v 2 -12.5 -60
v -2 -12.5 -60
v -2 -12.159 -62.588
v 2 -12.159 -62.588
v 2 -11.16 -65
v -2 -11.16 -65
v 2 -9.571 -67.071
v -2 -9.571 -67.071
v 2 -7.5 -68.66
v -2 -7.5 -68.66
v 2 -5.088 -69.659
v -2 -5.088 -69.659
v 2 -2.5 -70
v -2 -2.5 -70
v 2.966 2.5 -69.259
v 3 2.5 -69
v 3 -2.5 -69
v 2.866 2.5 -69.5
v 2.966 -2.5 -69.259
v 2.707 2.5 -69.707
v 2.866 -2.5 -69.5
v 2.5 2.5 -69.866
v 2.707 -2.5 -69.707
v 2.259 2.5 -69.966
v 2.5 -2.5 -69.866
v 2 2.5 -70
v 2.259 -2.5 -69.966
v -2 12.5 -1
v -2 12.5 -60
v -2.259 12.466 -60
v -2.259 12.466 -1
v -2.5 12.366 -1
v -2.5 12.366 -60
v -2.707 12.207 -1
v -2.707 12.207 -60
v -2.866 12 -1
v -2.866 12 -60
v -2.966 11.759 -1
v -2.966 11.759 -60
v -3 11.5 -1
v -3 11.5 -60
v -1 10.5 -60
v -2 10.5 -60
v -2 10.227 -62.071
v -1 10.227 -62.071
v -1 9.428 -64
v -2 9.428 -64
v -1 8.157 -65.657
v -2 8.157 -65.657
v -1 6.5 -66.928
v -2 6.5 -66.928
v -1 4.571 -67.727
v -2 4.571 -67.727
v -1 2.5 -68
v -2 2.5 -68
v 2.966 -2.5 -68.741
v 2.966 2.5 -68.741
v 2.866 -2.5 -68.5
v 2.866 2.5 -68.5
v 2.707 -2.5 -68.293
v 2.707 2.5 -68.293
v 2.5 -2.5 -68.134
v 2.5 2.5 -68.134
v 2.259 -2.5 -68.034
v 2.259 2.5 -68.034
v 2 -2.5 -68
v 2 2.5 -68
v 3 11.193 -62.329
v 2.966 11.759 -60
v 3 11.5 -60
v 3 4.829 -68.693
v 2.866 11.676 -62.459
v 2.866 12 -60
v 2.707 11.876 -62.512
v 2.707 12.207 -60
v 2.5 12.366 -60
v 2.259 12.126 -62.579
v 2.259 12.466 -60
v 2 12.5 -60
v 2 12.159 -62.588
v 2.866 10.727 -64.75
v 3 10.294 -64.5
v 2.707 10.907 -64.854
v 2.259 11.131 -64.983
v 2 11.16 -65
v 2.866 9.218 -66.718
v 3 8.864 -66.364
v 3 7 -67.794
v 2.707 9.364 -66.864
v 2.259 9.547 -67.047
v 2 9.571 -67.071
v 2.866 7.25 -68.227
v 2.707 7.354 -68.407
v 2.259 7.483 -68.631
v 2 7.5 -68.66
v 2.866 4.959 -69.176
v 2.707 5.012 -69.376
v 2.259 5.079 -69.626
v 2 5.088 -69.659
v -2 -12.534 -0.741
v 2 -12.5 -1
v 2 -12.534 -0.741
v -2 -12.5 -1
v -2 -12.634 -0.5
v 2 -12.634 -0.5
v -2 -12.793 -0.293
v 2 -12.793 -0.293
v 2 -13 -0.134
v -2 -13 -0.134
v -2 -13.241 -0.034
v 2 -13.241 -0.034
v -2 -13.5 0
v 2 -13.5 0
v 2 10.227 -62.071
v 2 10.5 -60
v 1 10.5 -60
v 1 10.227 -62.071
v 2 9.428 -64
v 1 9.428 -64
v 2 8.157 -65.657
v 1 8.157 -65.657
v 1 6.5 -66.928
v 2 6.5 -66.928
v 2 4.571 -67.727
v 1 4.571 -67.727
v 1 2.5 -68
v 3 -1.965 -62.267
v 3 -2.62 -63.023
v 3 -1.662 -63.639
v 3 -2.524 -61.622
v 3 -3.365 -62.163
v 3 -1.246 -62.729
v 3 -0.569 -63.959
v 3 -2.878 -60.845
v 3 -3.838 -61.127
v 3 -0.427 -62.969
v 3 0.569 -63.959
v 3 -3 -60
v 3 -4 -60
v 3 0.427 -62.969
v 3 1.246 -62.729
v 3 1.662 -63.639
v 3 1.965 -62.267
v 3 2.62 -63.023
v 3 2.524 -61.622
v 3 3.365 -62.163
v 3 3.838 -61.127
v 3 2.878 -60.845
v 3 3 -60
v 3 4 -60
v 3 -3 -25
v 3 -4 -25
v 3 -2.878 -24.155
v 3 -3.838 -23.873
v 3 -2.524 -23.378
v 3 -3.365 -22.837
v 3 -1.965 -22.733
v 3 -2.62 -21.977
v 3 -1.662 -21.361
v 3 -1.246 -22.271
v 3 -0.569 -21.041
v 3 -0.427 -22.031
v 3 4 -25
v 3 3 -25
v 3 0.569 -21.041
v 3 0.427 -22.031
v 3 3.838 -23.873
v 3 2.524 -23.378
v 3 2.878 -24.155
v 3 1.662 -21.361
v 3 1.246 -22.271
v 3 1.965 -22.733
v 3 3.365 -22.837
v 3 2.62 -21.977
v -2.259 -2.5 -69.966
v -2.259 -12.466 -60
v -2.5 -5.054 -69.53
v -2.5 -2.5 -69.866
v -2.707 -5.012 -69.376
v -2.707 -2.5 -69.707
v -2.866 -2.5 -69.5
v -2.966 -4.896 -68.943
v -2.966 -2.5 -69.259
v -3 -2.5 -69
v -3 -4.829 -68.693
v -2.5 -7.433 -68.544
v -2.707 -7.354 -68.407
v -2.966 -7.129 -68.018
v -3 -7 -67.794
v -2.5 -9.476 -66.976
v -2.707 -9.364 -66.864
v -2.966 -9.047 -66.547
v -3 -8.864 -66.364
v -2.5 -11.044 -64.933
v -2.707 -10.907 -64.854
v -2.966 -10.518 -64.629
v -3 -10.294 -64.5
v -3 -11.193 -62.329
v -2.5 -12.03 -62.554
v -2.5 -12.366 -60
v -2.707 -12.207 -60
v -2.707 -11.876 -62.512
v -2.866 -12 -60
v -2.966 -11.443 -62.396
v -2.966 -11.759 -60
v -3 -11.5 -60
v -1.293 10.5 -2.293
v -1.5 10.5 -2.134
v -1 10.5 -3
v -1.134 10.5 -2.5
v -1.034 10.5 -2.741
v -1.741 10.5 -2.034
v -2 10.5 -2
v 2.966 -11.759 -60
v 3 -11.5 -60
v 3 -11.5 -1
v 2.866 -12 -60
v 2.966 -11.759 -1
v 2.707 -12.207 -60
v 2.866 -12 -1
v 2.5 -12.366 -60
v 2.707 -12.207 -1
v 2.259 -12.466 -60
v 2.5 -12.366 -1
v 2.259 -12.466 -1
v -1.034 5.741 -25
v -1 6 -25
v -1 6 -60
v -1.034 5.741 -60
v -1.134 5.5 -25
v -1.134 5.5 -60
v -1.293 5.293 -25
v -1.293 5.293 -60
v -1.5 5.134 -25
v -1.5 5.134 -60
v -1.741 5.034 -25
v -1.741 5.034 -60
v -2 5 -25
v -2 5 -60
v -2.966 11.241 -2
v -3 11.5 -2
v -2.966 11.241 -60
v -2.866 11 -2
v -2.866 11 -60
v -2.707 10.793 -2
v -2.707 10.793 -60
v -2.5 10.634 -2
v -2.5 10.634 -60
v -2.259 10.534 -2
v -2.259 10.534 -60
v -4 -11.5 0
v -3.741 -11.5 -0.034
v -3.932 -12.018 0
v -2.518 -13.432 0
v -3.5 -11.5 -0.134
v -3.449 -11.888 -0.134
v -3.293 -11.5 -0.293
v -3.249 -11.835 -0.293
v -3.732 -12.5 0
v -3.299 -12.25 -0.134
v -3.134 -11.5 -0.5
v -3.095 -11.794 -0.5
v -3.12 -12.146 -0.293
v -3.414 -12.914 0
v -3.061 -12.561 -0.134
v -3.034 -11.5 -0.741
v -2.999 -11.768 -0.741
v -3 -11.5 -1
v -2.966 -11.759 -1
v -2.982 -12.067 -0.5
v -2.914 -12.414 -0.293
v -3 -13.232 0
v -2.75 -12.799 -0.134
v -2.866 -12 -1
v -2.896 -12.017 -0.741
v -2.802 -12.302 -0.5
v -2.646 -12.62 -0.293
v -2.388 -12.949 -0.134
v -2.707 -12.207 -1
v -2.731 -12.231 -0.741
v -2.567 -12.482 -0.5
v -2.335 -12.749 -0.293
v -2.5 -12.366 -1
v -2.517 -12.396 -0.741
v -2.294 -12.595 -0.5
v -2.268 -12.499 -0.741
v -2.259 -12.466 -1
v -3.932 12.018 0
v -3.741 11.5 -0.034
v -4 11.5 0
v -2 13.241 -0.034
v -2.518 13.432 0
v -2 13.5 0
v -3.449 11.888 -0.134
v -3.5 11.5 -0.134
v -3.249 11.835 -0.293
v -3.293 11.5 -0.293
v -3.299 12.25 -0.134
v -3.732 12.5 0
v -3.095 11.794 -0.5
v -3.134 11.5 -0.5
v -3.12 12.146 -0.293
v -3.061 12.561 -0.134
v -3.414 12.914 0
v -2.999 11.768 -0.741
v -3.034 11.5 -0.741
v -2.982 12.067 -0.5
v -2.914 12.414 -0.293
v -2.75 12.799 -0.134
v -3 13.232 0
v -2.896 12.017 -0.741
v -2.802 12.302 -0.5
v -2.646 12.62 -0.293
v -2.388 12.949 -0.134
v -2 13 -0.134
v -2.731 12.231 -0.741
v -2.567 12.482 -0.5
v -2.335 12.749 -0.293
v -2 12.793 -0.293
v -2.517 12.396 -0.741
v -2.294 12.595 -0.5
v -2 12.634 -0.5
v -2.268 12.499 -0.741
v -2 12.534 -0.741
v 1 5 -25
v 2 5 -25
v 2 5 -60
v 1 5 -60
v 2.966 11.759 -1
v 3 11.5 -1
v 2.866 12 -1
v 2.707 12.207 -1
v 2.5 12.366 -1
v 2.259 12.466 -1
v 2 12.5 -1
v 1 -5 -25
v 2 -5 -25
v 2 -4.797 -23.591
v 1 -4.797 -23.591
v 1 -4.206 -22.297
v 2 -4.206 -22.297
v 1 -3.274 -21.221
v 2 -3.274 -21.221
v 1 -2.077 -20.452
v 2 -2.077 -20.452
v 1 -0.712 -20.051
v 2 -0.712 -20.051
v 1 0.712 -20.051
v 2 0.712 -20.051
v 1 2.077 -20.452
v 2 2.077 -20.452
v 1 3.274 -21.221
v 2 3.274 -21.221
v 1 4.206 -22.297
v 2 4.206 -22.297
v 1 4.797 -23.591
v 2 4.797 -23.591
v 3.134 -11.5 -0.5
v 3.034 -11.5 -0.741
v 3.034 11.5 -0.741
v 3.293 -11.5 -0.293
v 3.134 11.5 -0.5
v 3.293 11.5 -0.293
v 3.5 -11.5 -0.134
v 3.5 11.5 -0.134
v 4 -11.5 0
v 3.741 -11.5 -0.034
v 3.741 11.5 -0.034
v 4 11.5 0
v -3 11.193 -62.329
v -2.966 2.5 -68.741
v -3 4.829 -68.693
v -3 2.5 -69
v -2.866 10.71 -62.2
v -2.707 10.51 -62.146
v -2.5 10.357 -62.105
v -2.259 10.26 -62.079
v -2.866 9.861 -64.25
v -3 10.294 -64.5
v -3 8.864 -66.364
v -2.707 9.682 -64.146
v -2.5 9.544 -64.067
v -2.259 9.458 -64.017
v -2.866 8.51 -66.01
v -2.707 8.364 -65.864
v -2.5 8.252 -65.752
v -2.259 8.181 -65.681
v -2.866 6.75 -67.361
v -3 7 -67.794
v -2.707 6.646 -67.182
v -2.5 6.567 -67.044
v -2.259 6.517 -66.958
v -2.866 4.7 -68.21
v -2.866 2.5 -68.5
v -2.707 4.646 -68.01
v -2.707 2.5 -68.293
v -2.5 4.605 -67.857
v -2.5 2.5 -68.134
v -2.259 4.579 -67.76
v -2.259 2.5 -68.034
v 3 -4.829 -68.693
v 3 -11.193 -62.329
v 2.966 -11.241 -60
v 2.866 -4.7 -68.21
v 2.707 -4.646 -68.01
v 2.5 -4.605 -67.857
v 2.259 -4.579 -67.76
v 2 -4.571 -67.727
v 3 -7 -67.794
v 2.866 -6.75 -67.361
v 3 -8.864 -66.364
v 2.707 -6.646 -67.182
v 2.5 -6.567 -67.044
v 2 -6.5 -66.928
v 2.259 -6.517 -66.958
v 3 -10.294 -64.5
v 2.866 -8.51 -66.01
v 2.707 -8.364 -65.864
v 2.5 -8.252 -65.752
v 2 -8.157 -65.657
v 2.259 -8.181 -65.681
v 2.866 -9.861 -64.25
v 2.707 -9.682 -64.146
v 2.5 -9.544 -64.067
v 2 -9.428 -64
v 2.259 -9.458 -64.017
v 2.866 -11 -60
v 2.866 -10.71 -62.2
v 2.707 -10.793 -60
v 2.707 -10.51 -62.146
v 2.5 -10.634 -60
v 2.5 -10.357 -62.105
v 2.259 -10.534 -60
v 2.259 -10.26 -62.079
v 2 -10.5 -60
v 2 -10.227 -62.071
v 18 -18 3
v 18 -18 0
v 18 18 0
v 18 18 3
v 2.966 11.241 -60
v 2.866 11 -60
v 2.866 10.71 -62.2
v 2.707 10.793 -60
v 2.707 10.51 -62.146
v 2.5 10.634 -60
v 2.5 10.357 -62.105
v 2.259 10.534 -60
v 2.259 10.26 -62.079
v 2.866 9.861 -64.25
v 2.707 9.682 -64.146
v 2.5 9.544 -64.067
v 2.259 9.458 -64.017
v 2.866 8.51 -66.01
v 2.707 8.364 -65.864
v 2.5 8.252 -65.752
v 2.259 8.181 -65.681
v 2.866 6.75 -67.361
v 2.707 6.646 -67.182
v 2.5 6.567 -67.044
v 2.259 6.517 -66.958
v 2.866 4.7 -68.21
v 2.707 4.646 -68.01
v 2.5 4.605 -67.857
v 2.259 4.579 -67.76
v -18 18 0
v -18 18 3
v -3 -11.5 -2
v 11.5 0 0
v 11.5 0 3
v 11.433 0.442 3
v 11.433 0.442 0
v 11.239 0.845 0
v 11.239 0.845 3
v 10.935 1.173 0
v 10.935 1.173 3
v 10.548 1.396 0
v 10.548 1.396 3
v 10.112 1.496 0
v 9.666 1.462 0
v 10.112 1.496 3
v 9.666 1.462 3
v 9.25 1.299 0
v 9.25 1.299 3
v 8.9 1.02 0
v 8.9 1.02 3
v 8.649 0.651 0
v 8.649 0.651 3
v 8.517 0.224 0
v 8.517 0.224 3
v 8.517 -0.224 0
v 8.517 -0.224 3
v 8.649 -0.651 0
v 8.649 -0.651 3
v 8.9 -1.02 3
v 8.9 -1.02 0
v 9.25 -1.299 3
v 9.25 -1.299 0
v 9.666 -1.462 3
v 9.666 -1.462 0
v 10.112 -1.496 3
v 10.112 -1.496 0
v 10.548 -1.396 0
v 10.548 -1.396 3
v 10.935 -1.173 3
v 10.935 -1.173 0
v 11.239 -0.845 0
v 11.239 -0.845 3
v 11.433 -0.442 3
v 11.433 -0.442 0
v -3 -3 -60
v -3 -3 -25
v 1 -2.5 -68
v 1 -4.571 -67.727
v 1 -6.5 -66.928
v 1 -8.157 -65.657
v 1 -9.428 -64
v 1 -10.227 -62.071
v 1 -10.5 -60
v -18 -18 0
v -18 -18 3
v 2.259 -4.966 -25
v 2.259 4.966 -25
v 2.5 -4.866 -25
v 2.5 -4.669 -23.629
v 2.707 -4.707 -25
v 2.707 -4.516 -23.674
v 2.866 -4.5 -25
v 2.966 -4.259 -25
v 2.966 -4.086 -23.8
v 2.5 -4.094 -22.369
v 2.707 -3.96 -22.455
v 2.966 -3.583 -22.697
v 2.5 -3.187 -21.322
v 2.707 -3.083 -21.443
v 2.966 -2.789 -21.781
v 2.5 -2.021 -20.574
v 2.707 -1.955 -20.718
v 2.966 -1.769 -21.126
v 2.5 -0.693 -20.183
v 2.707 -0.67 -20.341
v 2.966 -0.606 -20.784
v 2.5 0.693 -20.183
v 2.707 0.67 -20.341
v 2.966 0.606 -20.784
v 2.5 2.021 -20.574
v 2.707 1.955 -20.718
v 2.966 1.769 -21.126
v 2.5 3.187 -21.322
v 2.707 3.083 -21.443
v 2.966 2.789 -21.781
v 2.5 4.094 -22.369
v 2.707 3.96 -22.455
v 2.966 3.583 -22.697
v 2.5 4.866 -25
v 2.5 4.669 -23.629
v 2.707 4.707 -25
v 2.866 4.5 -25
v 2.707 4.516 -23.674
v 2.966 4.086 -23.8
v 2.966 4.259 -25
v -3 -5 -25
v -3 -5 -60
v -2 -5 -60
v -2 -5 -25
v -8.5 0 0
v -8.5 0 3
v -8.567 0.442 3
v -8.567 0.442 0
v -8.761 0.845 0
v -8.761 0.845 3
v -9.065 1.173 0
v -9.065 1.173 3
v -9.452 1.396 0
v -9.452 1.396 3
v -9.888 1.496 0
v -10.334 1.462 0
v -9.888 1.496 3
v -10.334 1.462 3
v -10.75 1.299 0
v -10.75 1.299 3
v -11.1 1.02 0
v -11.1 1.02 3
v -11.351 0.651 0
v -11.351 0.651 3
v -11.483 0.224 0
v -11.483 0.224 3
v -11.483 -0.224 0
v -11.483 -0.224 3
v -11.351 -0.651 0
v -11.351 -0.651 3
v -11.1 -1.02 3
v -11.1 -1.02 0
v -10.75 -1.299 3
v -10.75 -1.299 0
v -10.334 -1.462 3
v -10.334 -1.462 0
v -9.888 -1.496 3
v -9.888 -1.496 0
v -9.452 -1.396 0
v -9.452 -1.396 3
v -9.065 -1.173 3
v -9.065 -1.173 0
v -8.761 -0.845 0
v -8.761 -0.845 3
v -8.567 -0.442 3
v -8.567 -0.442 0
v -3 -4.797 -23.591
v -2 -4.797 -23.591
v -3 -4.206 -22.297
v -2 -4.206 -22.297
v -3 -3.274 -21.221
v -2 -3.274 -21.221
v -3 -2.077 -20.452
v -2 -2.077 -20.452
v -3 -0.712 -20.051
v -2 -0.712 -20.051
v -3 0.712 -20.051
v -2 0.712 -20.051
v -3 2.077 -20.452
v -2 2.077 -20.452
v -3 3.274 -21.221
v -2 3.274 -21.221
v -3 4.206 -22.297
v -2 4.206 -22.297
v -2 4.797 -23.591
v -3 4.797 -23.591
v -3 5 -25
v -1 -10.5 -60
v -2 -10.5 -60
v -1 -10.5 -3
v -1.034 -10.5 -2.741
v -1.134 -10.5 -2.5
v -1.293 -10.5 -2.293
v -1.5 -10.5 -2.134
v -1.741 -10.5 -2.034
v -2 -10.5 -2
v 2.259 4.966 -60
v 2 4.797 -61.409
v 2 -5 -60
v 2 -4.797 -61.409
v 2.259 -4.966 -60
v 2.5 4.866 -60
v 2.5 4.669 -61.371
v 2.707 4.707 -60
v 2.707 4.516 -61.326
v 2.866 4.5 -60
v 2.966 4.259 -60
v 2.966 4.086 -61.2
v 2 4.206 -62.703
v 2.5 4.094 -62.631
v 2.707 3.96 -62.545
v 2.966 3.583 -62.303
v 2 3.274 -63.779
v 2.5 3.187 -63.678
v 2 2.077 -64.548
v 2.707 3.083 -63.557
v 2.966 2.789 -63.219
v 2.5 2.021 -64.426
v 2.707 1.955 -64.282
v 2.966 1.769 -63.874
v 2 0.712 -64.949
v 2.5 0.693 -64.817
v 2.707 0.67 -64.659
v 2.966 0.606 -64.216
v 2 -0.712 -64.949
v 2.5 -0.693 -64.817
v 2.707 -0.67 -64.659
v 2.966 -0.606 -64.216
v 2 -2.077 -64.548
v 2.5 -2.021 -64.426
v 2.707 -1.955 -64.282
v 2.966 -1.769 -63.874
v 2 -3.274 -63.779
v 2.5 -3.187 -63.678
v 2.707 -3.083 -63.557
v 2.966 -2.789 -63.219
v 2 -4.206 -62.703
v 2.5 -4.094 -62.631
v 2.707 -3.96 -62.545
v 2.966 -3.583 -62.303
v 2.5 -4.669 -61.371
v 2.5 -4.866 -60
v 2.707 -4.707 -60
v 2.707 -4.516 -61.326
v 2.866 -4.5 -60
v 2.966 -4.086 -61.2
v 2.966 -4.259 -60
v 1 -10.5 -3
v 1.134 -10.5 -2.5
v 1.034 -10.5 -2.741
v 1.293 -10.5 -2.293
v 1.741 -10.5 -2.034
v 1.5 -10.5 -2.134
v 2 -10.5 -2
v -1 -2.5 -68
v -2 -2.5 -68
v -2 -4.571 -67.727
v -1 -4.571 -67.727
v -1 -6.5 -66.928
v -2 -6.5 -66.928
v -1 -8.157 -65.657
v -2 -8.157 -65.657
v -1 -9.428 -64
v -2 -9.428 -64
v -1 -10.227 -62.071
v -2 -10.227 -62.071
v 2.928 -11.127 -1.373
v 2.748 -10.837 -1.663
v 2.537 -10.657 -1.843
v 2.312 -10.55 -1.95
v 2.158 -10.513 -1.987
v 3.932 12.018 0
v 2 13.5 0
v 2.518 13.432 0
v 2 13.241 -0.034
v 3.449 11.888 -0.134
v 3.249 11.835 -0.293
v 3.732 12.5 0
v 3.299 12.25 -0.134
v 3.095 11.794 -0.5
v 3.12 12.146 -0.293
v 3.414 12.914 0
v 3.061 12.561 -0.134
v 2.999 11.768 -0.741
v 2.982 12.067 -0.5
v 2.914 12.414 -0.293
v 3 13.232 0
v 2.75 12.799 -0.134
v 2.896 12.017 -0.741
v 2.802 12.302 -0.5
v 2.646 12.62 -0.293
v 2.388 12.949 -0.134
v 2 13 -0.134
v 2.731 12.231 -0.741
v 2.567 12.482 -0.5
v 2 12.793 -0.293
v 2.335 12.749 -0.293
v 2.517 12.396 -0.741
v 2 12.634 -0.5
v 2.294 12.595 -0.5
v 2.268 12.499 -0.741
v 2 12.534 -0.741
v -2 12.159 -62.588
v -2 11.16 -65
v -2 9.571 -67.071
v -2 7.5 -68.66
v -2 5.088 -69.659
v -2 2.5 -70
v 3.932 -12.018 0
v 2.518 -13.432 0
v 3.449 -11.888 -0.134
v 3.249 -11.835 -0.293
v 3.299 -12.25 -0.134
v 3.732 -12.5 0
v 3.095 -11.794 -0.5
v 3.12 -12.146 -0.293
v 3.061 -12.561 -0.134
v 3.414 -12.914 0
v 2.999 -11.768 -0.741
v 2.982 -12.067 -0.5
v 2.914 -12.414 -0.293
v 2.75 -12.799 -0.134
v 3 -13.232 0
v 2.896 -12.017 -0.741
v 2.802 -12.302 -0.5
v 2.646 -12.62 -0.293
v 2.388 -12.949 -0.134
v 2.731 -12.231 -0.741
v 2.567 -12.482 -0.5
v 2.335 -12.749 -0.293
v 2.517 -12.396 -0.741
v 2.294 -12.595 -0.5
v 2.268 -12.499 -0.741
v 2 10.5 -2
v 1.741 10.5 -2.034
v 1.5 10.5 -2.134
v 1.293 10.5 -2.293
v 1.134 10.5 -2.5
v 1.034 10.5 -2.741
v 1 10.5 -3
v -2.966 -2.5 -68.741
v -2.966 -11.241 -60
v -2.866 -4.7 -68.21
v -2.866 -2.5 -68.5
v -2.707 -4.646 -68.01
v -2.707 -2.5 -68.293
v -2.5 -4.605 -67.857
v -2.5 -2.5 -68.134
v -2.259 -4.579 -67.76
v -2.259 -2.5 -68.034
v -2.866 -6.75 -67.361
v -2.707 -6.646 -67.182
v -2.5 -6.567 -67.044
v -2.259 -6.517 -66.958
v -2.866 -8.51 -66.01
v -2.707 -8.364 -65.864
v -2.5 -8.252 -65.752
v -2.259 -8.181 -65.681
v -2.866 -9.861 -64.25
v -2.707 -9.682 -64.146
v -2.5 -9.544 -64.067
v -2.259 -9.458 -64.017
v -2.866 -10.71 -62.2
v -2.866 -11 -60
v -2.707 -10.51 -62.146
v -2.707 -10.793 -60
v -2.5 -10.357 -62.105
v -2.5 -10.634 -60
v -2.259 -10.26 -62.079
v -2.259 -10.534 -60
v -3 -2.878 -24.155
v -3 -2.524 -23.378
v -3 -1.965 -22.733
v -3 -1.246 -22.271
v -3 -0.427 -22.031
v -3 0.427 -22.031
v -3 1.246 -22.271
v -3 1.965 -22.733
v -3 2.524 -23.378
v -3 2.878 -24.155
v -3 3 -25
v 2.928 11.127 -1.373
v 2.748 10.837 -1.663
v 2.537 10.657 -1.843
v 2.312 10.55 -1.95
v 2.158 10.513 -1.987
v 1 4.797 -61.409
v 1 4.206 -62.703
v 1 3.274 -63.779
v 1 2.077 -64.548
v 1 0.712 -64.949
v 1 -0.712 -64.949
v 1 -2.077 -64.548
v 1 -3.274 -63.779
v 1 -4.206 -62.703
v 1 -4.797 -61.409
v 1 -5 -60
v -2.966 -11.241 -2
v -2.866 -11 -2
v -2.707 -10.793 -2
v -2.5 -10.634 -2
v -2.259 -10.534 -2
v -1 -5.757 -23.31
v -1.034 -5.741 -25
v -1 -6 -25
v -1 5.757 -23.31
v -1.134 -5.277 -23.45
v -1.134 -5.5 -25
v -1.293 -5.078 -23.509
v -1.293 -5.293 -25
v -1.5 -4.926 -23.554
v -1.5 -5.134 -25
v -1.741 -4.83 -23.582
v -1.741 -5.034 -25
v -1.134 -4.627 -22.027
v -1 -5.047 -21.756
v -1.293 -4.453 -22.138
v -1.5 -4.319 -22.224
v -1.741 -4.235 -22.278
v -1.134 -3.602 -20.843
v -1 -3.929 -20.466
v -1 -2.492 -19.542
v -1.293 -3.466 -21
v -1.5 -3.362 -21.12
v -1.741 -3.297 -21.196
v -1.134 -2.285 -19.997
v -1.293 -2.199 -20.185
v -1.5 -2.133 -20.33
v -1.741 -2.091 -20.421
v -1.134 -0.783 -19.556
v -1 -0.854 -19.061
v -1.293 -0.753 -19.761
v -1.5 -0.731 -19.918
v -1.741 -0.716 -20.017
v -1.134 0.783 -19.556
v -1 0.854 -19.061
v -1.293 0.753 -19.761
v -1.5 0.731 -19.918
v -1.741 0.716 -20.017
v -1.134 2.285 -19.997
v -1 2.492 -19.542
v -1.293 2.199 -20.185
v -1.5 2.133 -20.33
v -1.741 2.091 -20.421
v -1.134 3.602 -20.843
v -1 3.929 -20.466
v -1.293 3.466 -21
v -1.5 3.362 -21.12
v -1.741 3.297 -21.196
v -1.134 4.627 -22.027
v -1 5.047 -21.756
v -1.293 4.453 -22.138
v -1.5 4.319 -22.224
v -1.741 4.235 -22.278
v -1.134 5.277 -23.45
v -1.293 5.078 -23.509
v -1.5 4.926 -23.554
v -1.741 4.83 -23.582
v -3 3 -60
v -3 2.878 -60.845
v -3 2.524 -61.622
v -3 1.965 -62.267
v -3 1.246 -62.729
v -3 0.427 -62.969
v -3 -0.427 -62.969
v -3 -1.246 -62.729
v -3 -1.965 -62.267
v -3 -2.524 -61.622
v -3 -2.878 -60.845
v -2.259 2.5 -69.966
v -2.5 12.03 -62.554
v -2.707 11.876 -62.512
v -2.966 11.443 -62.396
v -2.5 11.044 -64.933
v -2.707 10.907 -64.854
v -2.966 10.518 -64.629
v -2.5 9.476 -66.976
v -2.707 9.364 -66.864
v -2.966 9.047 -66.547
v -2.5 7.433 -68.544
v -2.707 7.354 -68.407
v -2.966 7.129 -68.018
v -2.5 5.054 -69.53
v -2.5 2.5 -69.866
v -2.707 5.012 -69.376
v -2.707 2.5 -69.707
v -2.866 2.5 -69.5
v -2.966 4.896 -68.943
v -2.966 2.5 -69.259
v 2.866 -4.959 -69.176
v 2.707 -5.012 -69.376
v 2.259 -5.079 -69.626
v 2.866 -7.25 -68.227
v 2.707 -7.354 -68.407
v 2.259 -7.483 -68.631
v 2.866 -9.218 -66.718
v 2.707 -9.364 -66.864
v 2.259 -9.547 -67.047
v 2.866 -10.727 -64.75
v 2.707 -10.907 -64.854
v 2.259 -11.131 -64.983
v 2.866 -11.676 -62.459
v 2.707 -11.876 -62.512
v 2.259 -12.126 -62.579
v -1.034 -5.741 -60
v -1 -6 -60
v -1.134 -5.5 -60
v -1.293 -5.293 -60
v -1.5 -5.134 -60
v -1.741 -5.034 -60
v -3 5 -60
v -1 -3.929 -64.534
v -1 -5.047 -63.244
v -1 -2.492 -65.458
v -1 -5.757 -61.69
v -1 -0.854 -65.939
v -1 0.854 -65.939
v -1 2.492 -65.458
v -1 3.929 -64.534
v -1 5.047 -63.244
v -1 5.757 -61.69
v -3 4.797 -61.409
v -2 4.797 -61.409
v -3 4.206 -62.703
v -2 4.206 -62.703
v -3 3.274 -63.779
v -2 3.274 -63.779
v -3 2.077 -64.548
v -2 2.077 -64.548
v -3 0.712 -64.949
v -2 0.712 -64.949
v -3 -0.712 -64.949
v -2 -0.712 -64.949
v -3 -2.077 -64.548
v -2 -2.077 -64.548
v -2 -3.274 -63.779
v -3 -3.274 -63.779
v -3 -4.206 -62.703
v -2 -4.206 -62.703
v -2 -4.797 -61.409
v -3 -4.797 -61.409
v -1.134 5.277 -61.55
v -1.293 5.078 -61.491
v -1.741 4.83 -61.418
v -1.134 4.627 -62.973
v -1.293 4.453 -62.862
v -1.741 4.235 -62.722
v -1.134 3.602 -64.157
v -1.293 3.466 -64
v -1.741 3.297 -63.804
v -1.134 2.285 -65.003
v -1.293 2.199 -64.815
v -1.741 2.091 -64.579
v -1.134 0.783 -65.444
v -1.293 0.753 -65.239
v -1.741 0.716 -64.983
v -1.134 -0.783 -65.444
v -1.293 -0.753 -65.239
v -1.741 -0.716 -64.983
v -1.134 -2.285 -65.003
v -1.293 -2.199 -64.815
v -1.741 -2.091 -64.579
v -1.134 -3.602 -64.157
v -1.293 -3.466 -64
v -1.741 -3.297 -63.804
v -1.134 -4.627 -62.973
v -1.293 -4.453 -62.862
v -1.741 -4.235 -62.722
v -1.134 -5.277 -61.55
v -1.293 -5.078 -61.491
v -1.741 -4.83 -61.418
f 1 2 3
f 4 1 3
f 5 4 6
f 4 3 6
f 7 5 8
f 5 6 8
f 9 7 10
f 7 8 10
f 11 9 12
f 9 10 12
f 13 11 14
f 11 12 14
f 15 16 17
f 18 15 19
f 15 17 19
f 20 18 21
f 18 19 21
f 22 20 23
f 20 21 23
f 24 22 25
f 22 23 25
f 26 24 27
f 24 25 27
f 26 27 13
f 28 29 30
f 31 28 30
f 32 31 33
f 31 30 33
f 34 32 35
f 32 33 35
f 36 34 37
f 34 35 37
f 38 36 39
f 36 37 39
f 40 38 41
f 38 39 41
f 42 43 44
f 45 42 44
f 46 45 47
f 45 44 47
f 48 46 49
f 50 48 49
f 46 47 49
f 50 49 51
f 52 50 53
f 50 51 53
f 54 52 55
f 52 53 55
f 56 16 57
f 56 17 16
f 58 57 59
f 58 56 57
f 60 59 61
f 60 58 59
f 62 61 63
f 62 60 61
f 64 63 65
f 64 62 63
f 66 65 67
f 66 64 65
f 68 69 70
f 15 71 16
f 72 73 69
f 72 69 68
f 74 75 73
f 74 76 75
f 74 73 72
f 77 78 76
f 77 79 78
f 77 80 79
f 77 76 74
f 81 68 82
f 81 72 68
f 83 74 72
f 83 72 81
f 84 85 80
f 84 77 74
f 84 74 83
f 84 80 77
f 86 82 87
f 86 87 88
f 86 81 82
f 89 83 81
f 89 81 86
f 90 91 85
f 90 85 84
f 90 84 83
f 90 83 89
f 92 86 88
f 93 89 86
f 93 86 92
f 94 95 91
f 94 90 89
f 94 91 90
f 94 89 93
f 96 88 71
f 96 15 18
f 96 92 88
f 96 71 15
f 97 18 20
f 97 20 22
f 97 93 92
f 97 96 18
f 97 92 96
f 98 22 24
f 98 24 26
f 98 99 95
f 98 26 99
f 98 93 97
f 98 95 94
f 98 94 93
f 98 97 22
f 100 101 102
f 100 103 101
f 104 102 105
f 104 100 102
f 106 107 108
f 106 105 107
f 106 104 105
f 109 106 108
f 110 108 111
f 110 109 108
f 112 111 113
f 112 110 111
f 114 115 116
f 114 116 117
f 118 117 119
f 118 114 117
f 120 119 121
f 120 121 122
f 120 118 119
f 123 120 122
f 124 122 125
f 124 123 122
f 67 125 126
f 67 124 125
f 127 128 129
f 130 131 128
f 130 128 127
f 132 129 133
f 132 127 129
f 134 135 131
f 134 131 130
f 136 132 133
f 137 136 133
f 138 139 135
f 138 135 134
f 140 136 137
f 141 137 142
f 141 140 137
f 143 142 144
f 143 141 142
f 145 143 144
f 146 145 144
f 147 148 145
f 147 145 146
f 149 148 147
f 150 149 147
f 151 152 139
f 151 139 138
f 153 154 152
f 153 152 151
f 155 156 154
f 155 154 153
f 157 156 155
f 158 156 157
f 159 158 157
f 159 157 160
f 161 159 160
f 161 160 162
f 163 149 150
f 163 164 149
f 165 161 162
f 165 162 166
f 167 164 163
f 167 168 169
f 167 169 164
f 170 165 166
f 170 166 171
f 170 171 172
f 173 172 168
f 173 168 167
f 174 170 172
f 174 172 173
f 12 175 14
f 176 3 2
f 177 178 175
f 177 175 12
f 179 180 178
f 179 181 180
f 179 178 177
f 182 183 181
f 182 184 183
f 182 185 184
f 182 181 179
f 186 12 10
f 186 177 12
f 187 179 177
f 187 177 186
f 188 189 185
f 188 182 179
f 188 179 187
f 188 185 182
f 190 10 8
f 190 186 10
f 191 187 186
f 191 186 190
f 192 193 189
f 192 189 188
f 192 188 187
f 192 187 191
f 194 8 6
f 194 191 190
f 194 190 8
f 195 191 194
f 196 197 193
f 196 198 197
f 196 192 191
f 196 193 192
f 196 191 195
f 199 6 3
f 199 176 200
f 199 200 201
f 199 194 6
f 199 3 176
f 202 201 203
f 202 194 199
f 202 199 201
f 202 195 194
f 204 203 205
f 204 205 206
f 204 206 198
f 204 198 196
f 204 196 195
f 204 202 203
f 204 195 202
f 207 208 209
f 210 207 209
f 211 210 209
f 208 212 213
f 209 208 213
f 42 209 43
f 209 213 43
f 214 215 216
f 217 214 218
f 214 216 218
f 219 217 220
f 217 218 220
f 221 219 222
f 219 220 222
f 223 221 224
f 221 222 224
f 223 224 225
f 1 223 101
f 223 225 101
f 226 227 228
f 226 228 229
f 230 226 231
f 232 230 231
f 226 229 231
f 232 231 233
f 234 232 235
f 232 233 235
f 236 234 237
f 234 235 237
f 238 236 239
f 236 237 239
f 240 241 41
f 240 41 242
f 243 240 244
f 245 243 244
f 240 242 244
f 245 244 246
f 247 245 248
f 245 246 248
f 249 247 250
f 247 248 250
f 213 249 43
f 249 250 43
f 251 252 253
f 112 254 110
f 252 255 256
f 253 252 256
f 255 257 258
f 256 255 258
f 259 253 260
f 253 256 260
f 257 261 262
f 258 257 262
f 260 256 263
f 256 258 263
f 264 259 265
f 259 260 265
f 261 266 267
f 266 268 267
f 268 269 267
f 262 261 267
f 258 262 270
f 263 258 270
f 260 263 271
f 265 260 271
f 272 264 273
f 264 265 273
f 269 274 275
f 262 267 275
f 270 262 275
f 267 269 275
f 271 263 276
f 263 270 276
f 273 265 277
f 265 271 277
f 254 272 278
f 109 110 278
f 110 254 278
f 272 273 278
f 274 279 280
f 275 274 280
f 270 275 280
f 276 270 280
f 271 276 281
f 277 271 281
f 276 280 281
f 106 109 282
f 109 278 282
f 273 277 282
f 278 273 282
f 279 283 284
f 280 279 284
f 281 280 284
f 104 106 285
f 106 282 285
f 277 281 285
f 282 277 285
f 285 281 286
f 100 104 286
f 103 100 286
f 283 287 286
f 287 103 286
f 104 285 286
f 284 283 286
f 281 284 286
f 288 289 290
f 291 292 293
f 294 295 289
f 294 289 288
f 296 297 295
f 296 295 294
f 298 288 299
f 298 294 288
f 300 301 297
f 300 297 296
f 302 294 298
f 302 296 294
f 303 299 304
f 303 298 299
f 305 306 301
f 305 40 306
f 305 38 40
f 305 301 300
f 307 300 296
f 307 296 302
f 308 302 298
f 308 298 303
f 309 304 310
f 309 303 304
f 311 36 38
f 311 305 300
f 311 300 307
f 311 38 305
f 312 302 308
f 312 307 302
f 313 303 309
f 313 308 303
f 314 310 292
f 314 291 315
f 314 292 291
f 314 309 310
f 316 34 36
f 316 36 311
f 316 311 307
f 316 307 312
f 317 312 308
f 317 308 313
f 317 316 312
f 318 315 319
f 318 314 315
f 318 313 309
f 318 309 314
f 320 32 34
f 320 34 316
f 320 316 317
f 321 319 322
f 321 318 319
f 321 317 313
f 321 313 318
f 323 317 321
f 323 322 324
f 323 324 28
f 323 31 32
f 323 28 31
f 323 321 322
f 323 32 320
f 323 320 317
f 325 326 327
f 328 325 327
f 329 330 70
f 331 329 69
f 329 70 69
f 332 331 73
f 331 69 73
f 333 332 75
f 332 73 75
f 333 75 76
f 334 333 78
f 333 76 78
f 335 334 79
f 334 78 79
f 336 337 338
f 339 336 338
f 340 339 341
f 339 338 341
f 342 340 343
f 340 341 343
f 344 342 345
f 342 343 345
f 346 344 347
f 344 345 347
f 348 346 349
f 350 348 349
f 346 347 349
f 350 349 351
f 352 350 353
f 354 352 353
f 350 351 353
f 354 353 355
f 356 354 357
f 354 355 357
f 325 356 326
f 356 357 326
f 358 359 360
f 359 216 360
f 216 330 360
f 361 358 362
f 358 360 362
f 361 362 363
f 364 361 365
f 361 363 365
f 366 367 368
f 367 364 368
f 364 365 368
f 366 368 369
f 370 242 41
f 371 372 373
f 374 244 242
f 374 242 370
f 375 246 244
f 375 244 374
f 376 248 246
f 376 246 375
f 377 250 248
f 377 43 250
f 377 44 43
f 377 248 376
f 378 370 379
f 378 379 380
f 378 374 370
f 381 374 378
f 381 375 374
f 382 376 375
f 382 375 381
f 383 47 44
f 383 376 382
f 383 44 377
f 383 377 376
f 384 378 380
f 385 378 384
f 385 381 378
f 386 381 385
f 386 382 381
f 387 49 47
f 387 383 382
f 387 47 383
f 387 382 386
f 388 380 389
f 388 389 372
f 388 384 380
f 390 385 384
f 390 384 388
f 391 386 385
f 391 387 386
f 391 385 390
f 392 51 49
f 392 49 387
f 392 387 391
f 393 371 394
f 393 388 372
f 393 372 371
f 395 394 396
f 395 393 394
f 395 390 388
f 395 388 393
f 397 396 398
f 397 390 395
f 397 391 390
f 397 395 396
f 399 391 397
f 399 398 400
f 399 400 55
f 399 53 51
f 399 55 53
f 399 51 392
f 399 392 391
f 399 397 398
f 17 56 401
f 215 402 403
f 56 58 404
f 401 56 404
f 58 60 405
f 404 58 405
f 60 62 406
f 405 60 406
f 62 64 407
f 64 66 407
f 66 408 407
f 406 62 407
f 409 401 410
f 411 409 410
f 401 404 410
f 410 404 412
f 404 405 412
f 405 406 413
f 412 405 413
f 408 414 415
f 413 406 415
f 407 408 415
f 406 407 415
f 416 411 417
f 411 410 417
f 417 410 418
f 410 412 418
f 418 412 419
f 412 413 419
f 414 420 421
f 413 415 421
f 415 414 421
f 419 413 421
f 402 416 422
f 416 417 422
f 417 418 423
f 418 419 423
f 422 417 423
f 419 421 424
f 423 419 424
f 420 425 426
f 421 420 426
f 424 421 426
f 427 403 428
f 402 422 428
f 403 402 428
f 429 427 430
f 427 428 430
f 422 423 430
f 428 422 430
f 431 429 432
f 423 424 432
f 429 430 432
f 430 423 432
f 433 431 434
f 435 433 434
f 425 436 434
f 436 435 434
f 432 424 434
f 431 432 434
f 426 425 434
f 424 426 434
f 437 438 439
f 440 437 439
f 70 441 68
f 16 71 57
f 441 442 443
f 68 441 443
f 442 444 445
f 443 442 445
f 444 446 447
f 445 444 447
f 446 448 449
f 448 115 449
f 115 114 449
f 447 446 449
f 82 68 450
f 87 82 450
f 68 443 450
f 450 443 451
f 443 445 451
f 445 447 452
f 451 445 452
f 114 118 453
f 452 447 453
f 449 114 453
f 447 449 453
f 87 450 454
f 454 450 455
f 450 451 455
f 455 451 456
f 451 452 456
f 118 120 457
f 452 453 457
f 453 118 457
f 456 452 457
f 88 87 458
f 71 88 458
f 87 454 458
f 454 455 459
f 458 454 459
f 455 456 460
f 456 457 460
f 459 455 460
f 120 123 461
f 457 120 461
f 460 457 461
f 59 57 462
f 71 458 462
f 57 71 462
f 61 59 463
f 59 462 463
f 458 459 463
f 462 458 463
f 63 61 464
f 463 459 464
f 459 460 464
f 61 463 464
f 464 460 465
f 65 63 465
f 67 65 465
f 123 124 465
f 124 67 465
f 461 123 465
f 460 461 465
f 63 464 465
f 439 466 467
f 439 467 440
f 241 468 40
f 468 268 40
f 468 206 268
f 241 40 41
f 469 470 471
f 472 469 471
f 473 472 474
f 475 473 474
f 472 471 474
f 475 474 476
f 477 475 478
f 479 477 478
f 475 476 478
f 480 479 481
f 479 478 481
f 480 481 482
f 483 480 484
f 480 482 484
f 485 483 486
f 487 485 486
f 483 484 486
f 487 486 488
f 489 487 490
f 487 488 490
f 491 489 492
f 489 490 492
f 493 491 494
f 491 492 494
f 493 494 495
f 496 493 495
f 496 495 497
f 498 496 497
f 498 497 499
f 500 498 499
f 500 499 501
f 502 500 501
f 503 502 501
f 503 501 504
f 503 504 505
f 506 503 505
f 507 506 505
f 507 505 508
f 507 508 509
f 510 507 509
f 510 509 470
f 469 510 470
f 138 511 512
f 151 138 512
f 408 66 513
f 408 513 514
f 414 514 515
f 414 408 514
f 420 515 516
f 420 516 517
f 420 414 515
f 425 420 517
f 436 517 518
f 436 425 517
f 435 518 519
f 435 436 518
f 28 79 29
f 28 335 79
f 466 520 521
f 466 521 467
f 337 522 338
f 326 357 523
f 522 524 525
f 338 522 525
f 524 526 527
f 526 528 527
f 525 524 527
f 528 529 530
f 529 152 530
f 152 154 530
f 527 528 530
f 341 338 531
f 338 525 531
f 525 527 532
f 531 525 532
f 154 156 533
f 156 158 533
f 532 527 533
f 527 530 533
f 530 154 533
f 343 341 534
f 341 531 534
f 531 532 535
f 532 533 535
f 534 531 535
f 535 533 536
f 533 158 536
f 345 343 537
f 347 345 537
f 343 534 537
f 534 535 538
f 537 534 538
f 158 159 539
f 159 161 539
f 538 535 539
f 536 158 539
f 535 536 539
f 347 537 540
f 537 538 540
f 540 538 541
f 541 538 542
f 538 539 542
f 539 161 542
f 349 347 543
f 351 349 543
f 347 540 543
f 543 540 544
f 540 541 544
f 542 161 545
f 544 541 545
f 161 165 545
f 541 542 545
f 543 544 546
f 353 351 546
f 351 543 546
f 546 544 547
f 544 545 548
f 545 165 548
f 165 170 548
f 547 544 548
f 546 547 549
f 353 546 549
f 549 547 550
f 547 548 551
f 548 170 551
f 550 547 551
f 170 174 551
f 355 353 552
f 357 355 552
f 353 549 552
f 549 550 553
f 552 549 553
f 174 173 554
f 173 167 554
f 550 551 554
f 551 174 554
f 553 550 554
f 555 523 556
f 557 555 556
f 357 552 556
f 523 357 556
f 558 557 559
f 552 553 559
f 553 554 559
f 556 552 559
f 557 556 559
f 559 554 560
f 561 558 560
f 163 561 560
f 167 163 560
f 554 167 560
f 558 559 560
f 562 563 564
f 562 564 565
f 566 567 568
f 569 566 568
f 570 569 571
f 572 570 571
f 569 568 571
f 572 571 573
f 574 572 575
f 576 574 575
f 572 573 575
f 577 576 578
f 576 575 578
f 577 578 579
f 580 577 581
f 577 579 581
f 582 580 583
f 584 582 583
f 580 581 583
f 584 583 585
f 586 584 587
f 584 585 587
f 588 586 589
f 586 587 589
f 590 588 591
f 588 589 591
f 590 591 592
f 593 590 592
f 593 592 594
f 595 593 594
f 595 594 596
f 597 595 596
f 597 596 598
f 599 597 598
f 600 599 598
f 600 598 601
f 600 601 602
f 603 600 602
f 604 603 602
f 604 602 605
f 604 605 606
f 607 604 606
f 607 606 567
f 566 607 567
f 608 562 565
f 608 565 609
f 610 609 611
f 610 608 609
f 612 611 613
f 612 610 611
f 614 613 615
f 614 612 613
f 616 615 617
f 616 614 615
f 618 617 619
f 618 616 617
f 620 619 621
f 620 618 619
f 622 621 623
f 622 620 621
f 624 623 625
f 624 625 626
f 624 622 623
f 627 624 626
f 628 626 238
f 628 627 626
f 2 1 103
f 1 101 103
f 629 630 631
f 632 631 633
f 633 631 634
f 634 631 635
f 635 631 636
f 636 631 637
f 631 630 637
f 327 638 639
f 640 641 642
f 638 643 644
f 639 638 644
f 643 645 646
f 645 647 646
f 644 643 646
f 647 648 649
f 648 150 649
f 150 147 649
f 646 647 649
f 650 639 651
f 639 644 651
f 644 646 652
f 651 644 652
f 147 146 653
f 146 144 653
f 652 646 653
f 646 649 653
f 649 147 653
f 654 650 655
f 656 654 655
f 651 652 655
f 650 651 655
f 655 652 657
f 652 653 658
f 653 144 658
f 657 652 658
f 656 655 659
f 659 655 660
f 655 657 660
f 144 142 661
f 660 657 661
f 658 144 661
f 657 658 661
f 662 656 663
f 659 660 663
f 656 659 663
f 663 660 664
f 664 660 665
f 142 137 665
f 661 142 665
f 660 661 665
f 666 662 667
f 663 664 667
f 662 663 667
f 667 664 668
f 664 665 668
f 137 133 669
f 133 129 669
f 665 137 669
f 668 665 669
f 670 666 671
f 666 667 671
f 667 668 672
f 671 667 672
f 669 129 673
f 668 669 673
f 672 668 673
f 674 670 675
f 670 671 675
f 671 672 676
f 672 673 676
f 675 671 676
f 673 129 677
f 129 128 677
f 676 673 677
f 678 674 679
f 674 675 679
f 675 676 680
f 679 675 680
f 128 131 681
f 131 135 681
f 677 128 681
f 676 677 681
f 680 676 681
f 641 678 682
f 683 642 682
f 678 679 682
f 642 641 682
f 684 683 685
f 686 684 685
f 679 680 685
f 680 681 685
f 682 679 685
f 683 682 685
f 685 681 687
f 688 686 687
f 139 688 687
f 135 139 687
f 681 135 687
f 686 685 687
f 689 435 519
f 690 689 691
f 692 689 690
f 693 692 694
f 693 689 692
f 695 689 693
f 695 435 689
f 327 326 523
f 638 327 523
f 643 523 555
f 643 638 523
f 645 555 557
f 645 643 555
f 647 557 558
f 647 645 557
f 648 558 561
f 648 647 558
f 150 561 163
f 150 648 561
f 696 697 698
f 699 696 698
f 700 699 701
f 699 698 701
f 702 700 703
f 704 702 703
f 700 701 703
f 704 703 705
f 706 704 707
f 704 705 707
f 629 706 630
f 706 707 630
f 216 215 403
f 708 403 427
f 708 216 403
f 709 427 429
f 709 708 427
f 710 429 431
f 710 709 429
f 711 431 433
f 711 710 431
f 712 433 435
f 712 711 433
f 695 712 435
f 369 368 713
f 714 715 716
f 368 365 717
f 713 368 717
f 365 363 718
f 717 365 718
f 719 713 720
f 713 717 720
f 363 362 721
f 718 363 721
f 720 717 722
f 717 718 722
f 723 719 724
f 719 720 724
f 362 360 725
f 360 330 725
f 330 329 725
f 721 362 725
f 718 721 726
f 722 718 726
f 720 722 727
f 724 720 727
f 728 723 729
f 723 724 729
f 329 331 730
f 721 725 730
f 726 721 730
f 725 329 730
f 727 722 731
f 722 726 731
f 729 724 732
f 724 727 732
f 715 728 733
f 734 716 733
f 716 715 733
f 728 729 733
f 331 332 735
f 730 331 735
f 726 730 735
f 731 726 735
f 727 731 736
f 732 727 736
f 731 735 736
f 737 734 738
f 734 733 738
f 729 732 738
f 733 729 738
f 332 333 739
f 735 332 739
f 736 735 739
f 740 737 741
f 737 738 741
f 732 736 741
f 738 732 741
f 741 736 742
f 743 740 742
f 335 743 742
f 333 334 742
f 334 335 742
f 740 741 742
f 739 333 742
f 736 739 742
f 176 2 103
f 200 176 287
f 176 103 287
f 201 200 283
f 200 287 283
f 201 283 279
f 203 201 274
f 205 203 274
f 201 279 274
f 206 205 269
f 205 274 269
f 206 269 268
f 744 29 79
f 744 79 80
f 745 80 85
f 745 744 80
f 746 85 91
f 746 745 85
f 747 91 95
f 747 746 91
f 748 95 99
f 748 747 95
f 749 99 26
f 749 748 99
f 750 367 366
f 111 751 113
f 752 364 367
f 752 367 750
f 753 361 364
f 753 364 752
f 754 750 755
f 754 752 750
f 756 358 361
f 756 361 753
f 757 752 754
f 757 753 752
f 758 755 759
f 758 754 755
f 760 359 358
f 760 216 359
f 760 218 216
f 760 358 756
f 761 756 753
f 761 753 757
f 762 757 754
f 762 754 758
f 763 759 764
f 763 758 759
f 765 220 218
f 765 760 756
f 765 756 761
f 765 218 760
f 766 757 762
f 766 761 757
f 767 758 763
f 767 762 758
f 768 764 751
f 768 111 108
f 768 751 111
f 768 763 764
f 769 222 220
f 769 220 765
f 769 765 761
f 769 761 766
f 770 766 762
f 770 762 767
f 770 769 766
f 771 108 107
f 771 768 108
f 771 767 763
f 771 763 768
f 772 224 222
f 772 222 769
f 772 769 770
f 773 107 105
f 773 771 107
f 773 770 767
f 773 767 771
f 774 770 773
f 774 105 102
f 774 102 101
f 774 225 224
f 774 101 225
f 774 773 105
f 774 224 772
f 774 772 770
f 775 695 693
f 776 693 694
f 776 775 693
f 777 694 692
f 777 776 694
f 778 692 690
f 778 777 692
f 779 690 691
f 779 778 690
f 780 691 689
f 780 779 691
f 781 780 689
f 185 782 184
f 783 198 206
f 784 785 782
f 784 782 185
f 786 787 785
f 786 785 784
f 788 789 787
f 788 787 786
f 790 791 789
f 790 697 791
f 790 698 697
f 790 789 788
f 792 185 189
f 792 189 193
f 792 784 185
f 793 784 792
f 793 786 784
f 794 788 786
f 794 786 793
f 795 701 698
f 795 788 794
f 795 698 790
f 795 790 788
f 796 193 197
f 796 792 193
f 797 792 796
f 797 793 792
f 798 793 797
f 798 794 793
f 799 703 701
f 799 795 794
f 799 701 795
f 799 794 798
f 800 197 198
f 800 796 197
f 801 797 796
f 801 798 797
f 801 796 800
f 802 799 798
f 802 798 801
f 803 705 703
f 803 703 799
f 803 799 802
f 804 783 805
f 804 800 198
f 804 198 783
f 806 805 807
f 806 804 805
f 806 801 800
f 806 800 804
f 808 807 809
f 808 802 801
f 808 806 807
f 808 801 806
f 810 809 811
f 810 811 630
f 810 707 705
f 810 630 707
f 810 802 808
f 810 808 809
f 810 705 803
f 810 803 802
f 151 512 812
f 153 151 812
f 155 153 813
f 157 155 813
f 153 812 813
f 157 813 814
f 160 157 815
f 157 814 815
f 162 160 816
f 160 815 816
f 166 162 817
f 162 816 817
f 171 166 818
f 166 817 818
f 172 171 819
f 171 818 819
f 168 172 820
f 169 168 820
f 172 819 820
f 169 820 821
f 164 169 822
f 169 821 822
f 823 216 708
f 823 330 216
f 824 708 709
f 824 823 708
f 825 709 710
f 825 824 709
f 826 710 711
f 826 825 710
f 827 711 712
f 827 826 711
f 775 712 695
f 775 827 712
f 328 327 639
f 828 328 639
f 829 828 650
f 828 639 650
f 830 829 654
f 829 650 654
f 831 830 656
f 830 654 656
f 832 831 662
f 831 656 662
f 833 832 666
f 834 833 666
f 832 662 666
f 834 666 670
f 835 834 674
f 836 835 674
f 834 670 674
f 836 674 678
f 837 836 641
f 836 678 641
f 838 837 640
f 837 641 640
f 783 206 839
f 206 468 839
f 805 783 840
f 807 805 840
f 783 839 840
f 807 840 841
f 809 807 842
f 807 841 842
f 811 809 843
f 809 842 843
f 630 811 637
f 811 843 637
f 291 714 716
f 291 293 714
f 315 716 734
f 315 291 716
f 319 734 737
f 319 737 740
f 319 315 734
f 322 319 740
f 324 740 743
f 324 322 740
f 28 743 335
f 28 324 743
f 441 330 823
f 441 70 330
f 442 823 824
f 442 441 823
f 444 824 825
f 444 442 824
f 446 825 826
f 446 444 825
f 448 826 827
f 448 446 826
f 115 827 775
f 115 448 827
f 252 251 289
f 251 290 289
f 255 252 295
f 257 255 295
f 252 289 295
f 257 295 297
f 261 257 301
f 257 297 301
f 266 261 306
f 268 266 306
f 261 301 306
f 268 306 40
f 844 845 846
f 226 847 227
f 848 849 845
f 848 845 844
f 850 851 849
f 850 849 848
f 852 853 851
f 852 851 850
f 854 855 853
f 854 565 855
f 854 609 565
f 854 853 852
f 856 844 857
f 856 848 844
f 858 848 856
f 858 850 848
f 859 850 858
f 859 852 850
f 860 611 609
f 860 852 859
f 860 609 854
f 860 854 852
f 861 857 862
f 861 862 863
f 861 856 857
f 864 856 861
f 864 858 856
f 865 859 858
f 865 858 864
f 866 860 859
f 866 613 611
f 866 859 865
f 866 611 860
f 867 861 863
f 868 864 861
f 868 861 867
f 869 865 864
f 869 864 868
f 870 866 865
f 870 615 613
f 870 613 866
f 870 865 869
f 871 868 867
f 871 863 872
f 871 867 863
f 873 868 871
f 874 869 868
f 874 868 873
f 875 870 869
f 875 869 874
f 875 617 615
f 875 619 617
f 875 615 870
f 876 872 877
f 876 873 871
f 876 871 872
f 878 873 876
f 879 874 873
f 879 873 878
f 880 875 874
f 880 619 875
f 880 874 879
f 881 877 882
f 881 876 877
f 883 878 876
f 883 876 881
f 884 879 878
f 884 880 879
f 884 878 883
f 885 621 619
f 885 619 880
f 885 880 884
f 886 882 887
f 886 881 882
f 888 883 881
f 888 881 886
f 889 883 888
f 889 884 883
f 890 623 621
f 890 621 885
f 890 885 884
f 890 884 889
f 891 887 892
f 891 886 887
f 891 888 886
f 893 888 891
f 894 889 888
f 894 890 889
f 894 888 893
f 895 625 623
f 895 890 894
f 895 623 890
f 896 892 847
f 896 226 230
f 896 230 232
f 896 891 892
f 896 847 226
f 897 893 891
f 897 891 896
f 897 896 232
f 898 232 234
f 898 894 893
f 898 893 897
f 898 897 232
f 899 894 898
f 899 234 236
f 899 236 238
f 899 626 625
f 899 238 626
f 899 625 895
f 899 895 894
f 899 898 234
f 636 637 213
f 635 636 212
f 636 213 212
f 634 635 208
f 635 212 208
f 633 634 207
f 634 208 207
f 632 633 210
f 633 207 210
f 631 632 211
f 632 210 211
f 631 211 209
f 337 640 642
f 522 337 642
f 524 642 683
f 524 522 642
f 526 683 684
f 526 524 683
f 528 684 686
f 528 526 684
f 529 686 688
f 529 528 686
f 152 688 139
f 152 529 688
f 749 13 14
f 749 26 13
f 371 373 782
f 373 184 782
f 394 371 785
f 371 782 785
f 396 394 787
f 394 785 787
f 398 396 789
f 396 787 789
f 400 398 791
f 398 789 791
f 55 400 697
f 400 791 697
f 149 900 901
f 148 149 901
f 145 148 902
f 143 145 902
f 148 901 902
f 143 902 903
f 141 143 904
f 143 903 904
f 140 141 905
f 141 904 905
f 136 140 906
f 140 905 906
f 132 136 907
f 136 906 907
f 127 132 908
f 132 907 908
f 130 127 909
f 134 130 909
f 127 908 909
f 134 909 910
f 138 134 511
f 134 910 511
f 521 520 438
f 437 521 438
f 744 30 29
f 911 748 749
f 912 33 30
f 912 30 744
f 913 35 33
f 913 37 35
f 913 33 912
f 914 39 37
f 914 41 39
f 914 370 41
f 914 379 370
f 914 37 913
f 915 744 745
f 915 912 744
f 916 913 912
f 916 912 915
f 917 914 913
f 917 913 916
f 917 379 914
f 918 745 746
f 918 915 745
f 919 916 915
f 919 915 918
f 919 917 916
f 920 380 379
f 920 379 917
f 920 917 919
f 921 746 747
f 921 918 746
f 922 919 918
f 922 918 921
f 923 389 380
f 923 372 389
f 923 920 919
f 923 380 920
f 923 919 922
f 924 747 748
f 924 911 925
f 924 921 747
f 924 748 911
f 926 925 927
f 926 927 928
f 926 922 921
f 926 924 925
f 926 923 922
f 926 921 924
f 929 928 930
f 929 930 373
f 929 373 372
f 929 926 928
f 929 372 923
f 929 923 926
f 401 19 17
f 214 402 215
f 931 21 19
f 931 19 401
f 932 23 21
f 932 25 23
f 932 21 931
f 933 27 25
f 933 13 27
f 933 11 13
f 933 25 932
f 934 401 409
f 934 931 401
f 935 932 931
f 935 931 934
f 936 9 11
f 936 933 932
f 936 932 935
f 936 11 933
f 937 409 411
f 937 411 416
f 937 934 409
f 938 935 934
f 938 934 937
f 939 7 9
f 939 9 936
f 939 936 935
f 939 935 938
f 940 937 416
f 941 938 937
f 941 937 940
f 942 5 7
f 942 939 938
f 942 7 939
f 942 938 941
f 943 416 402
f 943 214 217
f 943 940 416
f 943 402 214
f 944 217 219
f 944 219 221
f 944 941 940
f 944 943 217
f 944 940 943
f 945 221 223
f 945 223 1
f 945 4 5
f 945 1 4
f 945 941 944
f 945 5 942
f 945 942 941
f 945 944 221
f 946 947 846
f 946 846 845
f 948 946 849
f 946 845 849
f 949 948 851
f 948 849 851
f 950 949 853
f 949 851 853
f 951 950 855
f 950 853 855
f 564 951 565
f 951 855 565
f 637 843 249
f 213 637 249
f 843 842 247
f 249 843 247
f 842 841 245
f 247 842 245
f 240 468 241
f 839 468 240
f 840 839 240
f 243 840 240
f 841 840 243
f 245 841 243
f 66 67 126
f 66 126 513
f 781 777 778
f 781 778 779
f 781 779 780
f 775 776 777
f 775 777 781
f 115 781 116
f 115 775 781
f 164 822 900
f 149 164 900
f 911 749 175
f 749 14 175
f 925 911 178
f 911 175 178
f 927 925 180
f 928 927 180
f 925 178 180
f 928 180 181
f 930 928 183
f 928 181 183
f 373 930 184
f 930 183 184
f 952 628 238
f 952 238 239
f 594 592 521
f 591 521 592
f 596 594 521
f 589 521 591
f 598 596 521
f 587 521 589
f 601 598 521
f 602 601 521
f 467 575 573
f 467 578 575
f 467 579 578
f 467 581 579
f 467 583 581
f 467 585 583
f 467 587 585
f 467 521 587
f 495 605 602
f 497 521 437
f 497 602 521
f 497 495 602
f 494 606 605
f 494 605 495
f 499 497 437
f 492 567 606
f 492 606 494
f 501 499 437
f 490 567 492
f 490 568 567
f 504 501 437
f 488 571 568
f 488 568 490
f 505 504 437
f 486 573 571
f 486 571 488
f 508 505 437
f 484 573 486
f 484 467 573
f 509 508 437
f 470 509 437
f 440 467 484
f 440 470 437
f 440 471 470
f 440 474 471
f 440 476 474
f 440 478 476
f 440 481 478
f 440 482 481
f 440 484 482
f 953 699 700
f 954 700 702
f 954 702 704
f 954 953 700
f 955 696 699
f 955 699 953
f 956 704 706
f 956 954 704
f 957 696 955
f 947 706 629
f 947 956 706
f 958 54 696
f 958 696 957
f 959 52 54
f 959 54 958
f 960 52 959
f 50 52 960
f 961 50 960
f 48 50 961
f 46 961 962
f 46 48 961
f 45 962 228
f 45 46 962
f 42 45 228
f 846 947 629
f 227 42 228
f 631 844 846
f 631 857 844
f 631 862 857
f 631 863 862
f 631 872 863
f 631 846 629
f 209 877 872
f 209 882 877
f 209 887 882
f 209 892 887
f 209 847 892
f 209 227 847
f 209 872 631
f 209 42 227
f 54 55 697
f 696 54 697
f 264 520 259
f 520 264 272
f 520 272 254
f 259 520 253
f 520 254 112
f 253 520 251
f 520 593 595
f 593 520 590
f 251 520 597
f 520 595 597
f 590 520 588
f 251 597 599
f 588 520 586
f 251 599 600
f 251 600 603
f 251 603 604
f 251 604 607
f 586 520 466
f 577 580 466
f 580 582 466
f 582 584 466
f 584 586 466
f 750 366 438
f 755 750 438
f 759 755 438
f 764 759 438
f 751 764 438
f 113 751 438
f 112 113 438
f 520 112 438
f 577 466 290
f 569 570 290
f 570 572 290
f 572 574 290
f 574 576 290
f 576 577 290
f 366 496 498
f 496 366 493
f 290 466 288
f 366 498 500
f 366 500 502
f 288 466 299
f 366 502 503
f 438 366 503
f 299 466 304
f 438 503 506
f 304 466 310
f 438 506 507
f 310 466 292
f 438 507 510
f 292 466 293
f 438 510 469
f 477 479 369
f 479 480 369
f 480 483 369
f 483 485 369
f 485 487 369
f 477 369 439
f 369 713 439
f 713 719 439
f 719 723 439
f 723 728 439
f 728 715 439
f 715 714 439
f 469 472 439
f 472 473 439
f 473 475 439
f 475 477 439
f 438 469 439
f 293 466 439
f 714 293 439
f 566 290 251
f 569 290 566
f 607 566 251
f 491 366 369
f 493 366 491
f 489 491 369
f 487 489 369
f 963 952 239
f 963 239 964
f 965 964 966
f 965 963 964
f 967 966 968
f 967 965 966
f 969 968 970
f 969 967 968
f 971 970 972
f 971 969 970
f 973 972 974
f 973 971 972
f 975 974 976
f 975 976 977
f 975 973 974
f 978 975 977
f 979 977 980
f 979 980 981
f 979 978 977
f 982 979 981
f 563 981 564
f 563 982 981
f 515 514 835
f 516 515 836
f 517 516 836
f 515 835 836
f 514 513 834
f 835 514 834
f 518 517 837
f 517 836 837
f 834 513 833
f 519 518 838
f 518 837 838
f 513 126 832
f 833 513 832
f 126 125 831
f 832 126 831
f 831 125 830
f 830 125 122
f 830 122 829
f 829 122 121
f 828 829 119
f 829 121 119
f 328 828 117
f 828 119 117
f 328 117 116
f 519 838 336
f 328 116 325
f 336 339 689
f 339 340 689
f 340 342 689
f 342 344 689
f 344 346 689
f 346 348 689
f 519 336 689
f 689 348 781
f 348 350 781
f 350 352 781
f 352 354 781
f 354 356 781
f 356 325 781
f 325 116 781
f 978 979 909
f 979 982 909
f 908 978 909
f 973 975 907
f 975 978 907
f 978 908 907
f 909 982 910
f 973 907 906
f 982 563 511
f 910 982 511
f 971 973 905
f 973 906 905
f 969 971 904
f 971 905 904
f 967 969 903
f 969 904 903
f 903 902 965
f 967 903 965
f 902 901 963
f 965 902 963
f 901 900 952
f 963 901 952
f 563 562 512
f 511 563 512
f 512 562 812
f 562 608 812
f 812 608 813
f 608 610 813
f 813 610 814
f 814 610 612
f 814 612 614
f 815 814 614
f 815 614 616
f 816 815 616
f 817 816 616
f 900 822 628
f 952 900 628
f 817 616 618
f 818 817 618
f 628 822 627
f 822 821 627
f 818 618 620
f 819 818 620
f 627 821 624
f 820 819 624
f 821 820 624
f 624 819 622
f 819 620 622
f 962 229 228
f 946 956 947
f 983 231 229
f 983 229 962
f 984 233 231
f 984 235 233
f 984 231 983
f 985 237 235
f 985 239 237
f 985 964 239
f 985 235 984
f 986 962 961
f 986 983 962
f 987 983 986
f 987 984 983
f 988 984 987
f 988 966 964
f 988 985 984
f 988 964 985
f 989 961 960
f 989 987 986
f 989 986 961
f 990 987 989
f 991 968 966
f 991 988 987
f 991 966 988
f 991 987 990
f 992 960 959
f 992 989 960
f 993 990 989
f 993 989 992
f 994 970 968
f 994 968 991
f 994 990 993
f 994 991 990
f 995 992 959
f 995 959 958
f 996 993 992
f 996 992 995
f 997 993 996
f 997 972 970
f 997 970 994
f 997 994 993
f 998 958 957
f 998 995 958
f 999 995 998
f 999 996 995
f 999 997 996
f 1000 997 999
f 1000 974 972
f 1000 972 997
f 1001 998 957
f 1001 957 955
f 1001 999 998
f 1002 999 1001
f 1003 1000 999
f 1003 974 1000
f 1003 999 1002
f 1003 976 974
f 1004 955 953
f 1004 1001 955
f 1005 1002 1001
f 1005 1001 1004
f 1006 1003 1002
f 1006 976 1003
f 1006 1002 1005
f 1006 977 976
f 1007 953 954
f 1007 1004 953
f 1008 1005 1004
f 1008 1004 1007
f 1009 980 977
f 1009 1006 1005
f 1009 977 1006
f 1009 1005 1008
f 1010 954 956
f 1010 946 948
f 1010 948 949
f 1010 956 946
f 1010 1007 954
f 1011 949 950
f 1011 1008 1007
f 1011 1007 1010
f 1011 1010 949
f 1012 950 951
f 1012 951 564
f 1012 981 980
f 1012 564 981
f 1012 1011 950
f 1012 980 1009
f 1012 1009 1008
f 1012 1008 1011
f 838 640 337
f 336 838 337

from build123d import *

# Parameters (mm, degrees)
SKETCH1_W           = 36
SKETCH1_H           = 36
BOSS_EXTRUDE1_DEPTH = 3
SKETCH2_R           = 1.5
CUT_EXTRUDE1_DEPTH  = 26.632011236
SKETCH3_W           = 6
SKETCH3_H           = 25
BOSS_EXTRUDE2_DEPTH = 70
FILLET1_R           = 10
CUT_EXTRUDE2_DEPTH  = 76.266194271
CUT_EXTRUDE3_DEPTH  = 2
FILLET2_R           = 1


with BuildPart() as part:
    # Sketch1 → Boss-Extrude1 (new body)
    with BuildSketch(Plane.XY):
        Rectangle(SKETCH1_W, SKETCH1_H)
    extrude(amount=BOSS_EXTRUDE1_DEPTH)

    # Sketch2 → Cut-Extrude1 (cut, through all)
    with BuildSketch(Plane.XY.offset(3)):
        with Locations((-10, 0)):
            Circle(SKETCH2_R)
        with Locations((10, 0)):
            Circle(SKETCH2_R)
    extrude(amount=-CUT_EXTRUDE1_DEPTH, mode=Mode.SUBTRACT)

    # Sketch3 → Boss-Extrude2 (add)
    with BuildSketch(Plane(origin=(0, 0, 0), x_dir=(-1, 0, 0), z_dir=(0, 0, -1))):
        Rectangle(SKETCH3_W, SKETCH3_H)
    extrude(amount=BOSS_EXTRUDE2_DEPTH)

    # Fillet1
    fillet1_edges = [part.edges().sort_by_distance(p)[0] for p in [
        (0, -12.5, -70),
        (0, 12.5, -70),
    ]]
    fillet(fillet1_edges, radius=FILLET1_R)

    # Sketch4 → Cut-Extrude2 (cut, through all)
    with BuildSketch(Plane.ZY.offset(3)):
        with BuildLine():
            Line((-60, -3), (-25, -3))
            ThreePointArc((-25, -3), (-22, 0), (-25, 3))
            Line((-25, 3), (-60, 3))
            ThreePointArc((-60, 3), (-63, 0), (-60, -3))
        make_face()
    extrude(amount=-CUT_EXTRUDE2_DEPTH, mode=Mode.SUBTRACT)

    # Sketch6 → Cut-Extrude3 (cut)
    with BuildSketch(Plane.ZY.offset(3)):
        with BuildLine():
            Line((-2, -10.5), (-2, 10.5))
            Line((-2, 10.5), (-60, 10.5))
            ThreePointArc((-60, 10.5), (-65.656854249, 8.156854249), (-68, 2.5))
            Line((-68, 2.5), (-68, -2.5))
            ThreePointArc((-68, -2.5), (-65.656854249, -8.156854249), (-60, -10.5))
            Line((-60, -10.5), (-2, -10.5))
        make_face()
        with BuildLine():
            Line((-60, -5), (-25, -5))
            ThreePointArc((-25, -5), (-20, 0), (-25, 5))
            Line((-25, 5), (-60, 5))
            ThreePointArc((-60, 5), (-65, 0), (-60, -5))
        make_face(mode=Mode.SUBTRACT)
    cut_extrude3 = extrude(amount=-CUT_EXTRUDE3_DEPTH, mode=Mode.SUBTRACT)

    # Mirror1: Cut-Extrude3 across plane
    add(cut_extrude3.mirror(Plane(origin=(0, 0, 0), x_dir=(0, 0, 1), z_dir=(1, 0, 0))), mode=Mode.SUBTRACT)

    # Fillet2
    fillet2_edges = [part.edges().sort_by_distance(p)[0] for p in [
        (-3, 0, 0),
        (0, 12.5, 0),
        (0, -12.5, 0),
        (-1, -5, -42.5),
        (-1, 0, -65),
        (-1, 5, -42.5),
        (-3, 12.5, -30),
        (-3, -12.5, -30),
        (-3, -9.571067812, -67.071067812),
        (-3, 0, -70),
        (-3, 10.5, -31),
        (-3, 8.156854249, -65.656854249),
        (-3, 0, -68),
        (-3, -10.5, -31),
        (3, 12.5, -30),
        (3, 9.571067812, -67.071067812),
        (3, 0, -70),
        (3, -9.571067812, -67.071067812),
        (3, 0, -20),
        (3, -5, -42.5),
        (3, 0, -65),
        (3, -10.5, -31),
        (3, -8.156854249, -65.656854249),
        (3, 0, -68),
        (3, 8.156854249, -65.656854249),
        (-1, 0, -2),
        (-1, 0, -20),
        (-3, 9.571067812, -67.071067812),
        (-3, -8.156854249, -65.656854249),
        (3, -12.5, -30),
        (3, 0, 0),
        (3, 0, -2),
        (1, 0, -2),
        (3, 5, -42.5),
        (3, 10.5, -31),
    ]]
    fillet(fillet2_edges, radius=FILLET2_R - 0.0001)  # a hair under: the kernel refuses the full size


solid = part.part
